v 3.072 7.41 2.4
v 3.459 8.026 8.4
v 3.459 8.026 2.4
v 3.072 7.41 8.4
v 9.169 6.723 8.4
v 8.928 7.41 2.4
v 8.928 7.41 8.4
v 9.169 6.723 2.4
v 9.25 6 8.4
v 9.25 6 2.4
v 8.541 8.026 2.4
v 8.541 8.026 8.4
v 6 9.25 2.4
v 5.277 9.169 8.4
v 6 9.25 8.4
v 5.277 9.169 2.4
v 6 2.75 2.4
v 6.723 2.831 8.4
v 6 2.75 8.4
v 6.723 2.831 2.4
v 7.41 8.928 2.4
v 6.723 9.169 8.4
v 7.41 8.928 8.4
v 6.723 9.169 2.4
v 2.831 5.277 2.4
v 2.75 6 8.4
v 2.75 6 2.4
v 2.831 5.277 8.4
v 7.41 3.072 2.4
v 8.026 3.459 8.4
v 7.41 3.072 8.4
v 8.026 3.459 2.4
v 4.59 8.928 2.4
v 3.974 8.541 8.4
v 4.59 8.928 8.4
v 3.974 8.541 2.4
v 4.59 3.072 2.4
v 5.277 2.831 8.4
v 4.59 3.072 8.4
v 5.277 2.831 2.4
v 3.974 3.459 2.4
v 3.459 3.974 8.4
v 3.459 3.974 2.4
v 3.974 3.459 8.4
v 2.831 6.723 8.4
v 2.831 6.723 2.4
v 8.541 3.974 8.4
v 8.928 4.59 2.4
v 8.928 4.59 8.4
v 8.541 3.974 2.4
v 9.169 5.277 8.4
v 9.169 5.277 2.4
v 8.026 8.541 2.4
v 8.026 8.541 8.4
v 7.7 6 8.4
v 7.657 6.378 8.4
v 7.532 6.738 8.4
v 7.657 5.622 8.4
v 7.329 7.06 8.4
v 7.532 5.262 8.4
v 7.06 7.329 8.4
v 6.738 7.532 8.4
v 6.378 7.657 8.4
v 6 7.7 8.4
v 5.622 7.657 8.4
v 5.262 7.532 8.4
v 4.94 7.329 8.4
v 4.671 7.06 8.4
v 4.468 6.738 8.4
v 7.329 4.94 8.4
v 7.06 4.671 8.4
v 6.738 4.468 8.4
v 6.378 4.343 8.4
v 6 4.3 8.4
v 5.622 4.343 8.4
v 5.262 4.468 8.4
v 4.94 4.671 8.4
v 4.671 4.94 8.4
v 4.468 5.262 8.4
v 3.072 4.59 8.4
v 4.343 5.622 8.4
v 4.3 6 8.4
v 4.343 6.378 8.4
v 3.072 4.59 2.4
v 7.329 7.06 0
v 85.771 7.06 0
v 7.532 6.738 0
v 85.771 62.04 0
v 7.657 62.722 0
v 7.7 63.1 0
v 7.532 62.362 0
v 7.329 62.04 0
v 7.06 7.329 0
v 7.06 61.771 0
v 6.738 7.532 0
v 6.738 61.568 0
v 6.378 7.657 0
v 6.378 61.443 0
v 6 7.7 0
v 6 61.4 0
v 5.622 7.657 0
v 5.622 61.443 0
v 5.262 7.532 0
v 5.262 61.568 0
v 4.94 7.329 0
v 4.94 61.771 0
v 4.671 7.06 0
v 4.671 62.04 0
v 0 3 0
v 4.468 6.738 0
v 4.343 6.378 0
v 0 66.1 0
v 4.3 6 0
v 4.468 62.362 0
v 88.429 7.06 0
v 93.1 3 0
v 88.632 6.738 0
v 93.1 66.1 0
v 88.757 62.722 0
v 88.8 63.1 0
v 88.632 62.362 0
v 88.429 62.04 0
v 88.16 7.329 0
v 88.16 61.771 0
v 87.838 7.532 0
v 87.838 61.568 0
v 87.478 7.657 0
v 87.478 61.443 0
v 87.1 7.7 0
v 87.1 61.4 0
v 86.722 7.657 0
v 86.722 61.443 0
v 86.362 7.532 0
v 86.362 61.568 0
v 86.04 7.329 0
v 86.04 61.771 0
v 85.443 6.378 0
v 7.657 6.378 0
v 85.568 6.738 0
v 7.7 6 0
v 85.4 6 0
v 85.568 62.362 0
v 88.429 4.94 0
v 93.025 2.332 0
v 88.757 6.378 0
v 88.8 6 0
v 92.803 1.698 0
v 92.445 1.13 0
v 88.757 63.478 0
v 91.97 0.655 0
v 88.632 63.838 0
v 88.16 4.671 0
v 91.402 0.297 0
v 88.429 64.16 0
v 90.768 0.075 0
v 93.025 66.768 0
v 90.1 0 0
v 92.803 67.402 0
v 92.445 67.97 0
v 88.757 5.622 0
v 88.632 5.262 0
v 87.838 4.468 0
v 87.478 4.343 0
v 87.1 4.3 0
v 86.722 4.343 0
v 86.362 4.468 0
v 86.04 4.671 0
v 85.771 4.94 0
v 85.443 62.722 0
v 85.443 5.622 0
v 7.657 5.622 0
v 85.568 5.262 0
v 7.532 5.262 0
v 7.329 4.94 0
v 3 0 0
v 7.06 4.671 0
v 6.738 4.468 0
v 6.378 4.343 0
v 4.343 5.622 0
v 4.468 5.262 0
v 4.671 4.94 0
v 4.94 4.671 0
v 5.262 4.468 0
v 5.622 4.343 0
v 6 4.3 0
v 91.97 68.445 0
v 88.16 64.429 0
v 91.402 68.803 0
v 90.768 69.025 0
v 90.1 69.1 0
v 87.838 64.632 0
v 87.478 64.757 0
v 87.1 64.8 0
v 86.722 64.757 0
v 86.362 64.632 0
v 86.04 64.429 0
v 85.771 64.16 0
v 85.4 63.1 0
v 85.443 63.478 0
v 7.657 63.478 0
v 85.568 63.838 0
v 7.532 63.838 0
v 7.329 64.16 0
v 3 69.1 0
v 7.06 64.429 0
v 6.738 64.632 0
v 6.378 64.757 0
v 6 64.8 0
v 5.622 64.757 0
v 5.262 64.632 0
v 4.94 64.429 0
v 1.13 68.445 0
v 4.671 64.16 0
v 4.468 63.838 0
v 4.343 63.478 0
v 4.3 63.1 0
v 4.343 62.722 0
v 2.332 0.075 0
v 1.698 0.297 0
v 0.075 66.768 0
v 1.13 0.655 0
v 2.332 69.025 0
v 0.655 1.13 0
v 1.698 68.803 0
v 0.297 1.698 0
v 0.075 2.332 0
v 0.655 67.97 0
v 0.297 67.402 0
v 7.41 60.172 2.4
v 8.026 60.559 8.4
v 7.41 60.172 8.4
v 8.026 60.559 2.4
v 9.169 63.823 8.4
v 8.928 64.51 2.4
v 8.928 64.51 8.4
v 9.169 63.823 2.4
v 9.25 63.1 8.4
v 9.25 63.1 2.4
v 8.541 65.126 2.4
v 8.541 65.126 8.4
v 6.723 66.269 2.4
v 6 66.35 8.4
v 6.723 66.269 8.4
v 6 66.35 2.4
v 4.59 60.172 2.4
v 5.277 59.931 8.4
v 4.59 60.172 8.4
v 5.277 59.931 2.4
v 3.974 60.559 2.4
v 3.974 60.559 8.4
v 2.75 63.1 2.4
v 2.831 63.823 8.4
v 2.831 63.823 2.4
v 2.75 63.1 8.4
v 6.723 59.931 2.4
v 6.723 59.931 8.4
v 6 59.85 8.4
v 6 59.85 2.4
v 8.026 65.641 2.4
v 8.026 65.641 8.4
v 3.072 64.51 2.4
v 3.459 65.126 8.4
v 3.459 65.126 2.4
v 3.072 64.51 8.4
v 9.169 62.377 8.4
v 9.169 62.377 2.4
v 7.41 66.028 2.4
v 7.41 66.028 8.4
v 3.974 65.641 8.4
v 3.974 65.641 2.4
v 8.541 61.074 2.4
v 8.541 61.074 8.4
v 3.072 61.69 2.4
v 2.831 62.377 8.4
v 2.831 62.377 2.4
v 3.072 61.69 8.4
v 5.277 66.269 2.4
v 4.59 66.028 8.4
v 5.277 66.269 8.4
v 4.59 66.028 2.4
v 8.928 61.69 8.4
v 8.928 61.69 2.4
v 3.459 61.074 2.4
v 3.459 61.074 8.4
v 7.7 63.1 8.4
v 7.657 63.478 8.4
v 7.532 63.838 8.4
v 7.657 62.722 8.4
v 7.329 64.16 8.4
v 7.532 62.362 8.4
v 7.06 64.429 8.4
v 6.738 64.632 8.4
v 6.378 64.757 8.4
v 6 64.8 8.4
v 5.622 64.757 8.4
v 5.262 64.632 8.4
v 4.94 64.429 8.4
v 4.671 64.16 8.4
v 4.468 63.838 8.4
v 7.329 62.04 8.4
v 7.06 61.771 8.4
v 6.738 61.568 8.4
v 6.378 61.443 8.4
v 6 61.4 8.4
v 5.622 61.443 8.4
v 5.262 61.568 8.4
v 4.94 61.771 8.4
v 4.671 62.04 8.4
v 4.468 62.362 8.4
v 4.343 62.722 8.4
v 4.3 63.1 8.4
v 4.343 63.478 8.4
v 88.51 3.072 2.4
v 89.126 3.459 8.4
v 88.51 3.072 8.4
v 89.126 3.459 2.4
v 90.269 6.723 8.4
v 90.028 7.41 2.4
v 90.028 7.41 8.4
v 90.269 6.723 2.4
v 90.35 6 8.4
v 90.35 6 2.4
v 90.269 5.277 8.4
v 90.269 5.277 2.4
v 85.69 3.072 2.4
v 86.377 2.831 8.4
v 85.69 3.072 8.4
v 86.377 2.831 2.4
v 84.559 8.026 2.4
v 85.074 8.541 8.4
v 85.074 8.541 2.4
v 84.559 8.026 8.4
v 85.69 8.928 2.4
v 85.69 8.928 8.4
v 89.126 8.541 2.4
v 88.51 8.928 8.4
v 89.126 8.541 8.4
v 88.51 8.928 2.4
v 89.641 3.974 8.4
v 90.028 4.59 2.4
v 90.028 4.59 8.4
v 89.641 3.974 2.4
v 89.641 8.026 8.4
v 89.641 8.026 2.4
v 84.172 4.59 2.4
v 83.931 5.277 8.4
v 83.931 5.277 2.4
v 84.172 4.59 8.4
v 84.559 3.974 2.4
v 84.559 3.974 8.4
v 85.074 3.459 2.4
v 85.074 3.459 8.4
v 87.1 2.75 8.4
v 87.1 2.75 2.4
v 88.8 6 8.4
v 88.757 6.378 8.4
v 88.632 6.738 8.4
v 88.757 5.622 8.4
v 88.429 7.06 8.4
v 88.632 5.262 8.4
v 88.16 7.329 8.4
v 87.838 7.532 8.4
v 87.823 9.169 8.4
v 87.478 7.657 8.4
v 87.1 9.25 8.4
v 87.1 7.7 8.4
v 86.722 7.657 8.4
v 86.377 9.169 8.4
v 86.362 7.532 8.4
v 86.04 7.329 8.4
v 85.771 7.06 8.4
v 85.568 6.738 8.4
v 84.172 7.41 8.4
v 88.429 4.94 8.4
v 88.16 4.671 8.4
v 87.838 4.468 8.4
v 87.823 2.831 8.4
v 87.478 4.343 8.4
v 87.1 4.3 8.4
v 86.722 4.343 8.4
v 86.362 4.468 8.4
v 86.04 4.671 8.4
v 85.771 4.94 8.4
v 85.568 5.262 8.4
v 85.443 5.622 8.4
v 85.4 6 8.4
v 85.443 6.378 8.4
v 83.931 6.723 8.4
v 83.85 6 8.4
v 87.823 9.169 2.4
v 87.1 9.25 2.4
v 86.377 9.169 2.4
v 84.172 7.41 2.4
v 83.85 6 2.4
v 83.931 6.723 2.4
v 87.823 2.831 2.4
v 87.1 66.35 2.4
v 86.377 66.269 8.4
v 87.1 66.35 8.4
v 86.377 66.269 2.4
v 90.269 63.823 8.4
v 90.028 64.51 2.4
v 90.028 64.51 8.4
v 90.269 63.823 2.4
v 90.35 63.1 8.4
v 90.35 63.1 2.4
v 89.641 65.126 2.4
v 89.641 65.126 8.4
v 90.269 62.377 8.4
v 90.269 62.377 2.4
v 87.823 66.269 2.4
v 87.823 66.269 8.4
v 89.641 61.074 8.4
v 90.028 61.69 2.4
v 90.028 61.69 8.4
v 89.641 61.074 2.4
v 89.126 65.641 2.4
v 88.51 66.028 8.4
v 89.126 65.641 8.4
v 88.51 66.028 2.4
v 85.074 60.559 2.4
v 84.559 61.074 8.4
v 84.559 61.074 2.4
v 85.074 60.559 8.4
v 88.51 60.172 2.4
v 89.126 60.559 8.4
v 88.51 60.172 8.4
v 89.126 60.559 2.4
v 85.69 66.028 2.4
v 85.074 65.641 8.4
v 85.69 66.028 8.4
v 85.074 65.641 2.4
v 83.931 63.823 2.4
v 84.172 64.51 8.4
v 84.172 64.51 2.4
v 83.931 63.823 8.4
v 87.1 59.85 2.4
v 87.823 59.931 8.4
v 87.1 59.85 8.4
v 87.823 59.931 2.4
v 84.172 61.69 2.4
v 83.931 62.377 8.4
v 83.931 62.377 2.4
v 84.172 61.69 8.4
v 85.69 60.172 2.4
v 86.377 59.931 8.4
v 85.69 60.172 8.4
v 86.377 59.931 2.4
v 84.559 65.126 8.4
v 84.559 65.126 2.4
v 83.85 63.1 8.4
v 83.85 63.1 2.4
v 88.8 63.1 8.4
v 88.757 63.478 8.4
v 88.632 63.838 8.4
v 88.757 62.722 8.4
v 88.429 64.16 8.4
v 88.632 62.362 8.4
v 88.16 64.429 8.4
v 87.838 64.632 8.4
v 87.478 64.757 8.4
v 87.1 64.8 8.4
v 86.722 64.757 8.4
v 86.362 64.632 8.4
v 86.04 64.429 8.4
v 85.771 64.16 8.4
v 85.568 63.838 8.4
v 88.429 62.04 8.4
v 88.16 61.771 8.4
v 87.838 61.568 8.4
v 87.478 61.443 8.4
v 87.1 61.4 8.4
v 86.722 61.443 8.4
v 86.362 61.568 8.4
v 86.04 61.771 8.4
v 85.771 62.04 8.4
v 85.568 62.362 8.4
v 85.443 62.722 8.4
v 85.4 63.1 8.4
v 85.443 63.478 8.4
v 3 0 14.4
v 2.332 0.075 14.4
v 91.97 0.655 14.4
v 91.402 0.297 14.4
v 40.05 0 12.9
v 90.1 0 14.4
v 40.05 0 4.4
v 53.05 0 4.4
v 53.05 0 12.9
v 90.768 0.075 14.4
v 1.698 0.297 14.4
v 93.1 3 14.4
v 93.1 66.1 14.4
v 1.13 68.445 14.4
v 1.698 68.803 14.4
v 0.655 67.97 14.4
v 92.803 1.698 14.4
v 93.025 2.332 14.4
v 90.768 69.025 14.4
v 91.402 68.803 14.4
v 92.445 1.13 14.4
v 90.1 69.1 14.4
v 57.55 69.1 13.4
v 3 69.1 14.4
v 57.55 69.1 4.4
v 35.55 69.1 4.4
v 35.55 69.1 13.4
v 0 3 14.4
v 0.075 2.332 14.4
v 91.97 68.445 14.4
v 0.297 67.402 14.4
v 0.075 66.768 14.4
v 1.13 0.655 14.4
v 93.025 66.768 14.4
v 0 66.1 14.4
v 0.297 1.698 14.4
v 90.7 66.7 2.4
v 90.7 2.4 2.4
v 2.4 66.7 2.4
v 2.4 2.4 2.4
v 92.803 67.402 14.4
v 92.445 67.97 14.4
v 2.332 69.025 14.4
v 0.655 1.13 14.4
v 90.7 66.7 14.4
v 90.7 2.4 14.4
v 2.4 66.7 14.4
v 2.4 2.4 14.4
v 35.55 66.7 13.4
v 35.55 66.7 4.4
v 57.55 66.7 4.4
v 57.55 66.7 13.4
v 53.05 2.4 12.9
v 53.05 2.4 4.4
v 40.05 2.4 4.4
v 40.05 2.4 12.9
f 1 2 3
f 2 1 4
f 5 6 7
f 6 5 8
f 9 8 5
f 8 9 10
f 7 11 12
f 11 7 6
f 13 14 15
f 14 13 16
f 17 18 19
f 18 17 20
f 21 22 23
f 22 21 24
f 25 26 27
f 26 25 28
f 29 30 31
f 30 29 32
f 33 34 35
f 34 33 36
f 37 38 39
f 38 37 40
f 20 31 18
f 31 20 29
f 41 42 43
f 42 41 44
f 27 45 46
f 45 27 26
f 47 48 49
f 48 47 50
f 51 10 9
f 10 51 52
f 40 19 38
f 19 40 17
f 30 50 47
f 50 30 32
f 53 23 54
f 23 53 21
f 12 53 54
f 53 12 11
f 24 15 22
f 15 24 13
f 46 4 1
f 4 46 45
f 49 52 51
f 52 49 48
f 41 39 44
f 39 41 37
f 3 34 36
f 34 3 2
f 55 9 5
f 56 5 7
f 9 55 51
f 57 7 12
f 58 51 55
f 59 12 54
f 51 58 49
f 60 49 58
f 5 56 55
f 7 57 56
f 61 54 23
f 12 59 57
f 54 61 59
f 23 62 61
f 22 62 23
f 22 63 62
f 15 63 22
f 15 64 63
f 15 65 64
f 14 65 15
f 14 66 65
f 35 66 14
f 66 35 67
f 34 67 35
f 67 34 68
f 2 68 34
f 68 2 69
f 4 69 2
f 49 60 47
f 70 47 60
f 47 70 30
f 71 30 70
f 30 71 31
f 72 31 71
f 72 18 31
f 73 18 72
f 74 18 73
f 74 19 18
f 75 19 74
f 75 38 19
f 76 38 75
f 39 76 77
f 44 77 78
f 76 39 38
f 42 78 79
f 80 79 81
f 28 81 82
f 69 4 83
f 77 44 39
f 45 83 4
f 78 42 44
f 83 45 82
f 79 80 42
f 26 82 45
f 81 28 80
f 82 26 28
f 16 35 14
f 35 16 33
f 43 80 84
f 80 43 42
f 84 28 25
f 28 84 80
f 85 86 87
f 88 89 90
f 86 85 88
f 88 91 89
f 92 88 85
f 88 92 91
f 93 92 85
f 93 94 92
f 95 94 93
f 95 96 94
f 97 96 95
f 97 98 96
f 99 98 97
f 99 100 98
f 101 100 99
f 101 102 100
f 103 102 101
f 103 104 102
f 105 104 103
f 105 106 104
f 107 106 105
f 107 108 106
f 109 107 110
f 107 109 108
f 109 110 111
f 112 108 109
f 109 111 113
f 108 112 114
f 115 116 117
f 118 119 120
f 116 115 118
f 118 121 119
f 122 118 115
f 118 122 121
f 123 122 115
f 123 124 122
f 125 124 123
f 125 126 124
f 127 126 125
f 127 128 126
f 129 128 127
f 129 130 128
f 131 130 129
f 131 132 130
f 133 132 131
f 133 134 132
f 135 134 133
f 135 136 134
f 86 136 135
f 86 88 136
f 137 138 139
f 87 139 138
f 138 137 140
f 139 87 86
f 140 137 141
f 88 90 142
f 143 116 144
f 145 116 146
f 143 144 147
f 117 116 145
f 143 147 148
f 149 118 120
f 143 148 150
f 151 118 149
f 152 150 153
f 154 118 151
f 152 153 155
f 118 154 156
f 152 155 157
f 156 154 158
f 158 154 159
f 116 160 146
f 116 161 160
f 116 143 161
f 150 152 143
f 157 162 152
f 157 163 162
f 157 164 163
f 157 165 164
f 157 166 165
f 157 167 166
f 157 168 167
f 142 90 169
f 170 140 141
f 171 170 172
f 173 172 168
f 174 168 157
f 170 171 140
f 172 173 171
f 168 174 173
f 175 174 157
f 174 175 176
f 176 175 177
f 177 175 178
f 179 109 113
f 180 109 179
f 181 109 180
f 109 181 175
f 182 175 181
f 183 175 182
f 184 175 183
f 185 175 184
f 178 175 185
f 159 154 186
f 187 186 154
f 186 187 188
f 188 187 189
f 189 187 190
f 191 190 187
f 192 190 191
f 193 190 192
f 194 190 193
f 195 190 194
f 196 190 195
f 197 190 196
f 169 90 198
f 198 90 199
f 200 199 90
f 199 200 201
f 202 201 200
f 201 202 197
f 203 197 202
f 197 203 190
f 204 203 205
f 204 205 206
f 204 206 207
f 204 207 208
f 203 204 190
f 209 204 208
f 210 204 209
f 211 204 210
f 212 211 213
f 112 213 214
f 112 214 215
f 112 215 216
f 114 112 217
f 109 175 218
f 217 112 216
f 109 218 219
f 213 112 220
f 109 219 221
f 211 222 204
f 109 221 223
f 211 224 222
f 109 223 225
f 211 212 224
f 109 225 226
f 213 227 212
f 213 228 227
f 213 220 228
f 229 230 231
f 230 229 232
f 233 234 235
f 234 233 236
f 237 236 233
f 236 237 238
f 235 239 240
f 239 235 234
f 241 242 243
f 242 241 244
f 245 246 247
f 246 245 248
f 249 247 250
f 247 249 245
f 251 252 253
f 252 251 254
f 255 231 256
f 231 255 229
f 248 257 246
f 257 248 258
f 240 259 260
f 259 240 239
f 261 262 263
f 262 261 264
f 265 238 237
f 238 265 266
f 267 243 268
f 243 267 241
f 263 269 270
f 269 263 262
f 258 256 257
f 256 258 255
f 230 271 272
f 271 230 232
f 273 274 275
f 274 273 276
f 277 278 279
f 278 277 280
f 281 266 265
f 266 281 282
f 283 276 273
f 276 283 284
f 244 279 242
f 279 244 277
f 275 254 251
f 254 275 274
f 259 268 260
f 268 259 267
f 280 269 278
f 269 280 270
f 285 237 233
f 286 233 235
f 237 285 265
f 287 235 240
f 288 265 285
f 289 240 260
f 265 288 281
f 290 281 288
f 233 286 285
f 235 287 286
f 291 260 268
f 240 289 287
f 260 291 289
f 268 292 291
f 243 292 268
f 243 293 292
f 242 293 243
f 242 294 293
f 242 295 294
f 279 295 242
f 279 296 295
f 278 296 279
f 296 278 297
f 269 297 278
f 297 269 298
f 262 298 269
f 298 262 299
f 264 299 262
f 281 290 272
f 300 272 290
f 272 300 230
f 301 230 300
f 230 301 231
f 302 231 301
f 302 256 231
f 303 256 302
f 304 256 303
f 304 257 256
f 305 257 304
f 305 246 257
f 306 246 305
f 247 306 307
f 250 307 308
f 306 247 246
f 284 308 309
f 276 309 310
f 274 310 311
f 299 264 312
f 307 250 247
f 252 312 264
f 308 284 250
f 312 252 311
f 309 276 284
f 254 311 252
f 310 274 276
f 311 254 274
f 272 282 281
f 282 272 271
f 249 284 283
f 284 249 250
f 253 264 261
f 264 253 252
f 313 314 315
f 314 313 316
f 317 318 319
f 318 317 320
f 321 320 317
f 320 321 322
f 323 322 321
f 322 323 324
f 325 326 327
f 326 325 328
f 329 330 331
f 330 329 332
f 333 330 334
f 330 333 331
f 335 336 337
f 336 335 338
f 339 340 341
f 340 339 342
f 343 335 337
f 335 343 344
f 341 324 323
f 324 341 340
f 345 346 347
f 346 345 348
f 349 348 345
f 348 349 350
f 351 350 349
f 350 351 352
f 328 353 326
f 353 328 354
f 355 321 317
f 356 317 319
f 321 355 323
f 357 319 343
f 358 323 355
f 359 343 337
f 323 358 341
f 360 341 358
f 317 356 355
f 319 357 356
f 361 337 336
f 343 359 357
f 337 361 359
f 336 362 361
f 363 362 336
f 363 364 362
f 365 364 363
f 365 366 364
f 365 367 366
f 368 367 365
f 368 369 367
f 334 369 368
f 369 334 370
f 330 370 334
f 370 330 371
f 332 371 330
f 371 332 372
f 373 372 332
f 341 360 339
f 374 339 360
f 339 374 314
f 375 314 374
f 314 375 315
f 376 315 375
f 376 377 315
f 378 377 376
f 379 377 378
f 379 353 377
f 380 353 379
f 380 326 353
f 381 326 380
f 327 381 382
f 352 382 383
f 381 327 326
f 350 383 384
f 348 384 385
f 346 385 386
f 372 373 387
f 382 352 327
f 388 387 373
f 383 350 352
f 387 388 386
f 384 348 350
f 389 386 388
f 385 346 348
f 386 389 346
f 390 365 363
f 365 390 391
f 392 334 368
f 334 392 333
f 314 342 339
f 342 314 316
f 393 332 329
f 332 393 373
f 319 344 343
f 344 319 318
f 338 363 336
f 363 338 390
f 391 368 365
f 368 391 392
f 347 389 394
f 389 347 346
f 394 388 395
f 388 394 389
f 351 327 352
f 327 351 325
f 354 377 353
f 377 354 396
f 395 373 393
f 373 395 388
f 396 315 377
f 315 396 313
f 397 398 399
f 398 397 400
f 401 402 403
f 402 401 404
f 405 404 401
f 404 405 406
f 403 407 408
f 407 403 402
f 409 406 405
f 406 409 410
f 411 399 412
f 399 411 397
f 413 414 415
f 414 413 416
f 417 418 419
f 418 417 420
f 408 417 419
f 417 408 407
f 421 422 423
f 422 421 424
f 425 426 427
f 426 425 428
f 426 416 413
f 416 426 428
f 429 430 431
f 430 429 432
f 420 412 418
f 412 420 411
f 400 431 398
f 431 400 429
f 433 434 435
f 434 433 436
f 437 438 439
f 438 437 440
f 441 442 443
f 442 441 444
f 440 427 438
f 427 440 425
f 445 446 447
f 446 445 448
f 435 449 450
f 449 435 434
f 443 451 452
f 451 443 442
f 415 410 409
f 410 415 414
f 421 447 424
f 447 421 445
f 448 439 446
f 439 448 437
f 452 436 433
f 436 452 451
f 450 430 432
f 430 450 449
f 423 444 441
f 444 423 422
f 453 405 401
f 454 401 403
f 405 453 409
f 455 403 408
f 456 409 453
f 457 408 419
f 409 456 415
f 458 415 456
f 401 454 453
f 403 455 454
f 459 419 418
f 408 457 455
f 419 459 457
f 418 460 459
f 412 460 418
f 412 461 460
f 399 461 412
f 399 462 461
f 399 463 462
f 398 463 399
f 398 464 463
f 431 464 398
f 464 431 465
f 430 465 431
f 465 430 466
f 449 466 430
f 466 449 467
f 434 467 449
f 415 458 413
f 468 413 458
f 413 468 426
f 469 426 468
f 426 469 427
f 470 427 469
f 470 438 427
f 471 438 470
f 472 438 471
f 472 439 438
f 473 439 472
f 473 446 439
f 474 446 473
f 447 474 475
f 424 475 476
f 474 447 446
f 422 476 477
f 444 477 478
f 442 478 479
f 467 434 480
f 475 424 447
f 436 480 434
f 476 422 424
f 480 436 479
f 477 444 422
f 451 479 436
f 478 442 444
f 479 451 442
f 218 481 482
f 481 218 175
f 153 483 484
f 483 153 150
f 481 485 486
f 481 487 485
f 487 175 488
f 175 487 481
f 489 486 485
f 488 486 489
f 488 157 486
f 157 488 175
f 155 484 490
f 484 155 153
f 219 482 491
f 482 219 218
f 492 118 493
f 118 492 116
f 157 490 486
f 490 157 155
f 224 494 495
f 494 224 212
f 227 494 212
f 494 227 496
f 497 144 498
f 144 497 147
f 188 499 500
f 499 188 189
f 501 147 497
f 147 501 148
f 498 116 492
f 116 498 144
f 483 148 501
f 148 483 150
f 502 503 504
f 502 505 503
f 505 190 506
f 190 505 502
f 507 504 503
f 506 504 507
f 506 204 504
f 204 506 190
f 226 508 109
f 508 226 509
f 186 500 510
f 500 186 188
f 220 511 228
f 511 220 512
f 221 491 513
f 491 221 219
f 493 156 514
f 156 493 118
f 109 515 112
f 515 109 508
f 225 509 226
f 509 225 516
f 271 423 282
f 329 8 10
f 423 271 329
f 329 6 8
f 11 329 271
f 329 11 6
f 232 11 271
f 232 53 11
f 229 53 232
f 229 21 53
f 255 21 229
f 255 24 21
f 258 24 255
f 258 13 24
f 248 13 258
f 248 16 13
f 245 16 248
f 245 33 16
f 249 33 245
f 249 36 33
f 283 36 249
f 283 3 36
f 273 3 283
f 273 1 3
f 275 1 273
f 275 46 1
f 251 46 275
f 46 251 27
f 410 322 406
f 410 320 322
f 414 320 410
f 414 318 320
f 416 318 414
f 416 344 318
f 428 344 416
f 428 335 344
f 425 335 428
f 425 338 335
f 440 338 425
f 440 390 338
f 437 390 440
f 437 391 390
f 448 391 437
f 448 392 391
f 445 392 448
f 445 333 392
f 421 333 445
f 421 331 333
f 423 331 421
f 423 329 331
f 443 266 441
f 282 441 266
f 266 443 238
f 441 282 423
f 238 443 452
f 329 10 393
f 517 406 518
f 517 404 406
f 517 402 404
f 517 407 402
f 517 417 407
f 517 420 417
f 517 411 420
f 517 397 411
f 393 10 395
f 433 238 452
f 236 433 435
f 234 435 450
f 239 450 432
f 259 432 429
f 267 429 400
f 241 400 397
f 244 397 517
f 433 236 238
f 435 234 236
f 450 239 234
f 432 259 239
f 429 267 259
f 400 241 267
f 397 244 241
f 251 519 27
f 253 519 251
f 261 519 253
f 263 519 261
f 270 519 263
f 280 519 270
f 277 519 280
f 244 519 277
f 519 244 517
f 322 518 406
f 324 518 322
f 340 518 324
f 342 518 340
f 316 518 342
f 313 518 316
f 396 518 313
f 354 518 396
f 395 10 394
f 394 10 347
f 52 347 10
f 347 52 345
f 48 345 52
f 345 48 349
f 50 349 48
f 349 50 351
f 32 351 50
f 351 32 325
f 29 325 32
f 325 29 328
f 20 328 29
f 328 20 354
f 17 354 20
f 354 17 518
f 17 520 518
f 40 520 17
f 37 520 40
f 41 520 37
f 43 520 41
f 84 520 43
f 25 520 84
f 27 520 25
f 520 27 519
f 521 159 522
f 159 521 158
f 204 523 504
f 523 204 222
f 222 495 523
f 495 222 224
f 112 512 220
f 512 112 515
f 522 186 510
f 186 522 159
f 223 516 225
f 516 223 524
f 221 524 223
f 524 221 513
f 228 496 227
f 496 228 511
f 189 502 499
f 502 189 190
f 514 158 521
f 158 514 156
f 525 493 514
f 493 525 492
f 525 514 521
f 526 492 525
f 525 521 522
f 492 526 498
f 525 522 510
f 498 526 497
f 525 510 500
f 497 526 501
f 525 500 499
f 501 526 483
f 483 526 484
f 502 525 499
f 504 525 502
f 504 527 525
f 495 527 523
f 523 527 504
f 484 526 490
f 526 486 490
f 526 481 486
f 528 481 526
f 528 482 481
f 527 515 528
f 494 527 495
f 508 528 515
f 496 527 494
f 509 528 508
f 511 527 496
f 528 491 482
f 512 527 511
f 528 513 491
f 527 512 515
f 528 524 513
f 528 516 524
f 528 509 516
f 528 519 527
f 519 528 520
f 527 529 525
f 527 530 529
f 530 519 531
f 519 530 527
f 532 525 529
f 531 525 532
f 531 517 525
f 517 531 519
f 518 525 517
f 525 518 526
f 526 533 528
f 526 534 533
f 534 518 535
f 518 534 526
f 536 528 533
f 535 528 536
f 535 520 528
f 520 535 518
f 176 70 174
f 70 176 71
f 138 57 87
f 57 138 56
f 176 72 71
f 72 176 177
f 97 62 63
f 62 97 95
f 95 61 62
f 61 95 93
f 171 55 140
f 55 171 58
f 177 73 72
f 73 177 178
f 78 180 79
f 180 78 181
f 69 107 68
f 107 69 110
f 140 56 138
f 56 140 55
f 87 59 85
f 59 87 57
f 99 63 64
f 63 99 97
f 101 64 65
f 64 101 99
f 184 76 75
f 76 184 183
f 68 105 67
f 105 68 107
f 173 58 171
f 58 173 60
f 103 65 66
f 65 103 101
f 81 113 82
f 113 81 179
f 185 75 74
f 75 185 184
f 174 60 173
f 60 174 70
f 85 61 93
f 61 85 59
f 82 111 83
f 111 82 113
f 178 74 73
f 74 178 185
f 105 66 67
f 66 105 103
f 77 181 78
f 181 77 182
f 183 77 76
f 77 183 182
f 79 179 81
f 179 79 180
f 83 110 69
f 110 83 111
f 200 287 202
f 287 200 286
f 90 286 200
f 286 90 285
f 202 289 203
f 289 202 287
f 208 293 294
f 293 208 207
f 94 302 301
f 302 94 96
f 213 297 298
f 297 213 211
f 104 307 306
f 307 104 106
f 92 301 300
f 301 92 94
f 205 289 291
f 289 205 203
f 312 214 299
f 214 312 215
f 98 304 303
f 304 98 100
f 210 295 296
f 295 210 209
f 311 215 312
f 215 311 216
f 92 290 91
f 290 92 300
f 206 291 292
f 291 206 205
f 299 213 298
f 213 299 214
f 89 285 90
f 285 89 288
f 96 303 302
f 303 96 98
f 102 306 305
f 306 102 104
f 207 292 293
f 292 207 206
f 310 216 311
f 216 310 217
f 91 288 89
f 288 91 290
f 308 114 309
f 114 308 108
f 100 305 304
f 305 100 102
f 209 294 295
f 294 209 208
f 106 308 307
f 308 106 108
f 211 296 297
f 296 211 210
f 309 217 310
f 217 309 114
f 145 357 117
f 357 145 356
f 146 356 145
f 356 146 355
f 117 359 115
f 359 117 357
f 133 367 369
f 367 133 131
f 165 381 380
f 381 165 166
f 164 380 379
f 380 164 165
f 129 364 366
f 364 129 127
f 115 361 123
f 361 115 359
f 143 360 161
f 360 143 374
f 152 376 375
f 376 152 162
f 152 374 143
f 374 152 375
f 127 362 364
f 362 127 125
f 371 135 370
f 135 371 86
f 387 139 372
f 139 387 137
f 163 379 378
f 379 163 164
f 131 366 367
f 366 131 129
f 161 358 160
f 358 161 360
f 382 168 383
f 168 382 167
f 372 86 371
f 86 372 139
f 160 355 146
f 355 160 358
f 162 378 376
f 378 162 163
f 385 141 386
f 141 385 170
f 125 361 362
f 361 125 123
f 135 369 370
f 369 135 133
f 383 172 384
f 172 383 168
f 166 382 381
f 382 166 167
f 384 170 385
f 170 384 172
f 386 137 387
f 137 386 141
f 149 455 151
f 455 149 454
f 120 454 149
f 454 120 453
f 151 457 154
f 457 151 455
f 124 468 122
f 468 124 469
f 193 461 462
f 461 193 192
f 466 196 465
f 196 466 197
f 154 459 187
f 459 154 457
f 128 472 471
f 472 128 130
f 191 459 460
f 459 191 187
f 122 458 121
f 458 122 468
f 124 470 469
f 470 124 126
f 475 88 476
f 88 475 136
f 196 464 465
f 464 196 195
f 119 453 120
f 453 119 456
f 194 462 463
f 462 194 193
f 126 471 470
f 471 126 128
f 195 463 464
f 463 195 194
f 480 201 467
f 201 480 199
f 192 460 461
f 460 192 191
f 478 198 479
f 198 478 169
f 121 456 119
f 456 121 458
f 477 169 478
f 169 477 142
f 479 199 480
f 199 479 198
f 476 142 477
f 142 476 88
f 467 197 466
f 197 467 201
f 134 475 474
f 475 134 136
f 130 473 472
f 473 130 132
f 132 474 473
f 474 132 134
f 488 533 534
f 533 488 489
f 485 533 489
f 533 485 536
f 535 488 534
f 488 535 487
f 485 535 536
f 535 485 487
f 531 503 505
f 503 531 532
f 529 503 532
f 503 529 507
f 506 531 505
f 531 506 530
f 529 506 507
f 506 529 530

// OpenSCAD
// Two-piece FDM display shell. Face-on-bed bezel, walls-up base. mm.

pcb_x = 88.3;
pcb_y = 64.3;
bezel_z = 2.4;
wall = 2.4;
floor_t = 2.4;
wall_h = 12;
window_inset = 5;
usb_w = 13.0;
usb_h = 8.5;
stemma_w = 22;
stemma_h = 9;
post_d = 6.5;
post_hole_d = 3.4;
post_inset = 6;
which = "base";
$fn = 28;

outer_x = pcb_x + 2 * wall;
outer_y = pcb_y + 2 * wall;

module rounded_rect(x, y, r) {
    offset(r = r)
        offset(delta = -r)
            square([x, y], center = false);
}

module base() {
    difference() {
        union() {
            linear_extrude(height = floor_t)
                rounded_rect(outer_x, outer_y, 3);
            linear_extrude(height = floor_t + wall_h)
                difference() {
                    rounded_rect(outer_x, outer_y, 3);
                    translate([wall, wall])
                        square([pcb_x, pcb_y]);
                }
            for (sx = [post_inset, outer_x - post_inset],
                 sy = [post_inset, outer_y - post_inset])
                translate([sx, sy, 0])
                    cylinder(d = post_d, h = floor_t + 6);
        }
        // USB on the short edge (Y = 0)
        translate([outer_x / 2 - usb_w / 2, -1, floor_t + 2])
            cube([usb_w, wall + 2, usb_h]);
        // STEMMA on the opposite short edge
        translate([outer_x / 2 - stemma_w / 2, outer_y - wall - 1, floor_t + 2])
            cube([stemma_w, wall + 2, stemma_h]);
        for (sx = [post_inset, outer_x - post_inset],
             sy = [post_inset, outer_y - post_inset])
            translate([sx, sy, -1])
                cylinder(d = post_hole_d, h = floor_t + 10);
    }
}

module bezel() {
    stop = 1.2;
    difference() {
        union() {
            linear_extrude(height = bezel_z)
                rounded_rect(outer_x, outer_y, 3);
            translate([wall, wall, bezel_z])
                linear_extrude(height = stop)
                    difference() {
                        square([pcb_x, pcb_y]);
                        translate([1.2, 1.2])
                            square([pcb_x - 2.4, pcb_y - 2.4]);
                    }
        }
        translate([wall + window_inset, wall + window_inset, -1])
            cube([
                pcb_x - 2 * window_inset,
                pcb_y - 2 * window_inset,
                bezel_z + stop + 2
            ]);
        // reset poke
        translate([outer_x - 10, 10, -1])
            cylinder(d = 6.5, h = bezel_z + 2);
    }
}

if (which == "base") base();
else bezel();
